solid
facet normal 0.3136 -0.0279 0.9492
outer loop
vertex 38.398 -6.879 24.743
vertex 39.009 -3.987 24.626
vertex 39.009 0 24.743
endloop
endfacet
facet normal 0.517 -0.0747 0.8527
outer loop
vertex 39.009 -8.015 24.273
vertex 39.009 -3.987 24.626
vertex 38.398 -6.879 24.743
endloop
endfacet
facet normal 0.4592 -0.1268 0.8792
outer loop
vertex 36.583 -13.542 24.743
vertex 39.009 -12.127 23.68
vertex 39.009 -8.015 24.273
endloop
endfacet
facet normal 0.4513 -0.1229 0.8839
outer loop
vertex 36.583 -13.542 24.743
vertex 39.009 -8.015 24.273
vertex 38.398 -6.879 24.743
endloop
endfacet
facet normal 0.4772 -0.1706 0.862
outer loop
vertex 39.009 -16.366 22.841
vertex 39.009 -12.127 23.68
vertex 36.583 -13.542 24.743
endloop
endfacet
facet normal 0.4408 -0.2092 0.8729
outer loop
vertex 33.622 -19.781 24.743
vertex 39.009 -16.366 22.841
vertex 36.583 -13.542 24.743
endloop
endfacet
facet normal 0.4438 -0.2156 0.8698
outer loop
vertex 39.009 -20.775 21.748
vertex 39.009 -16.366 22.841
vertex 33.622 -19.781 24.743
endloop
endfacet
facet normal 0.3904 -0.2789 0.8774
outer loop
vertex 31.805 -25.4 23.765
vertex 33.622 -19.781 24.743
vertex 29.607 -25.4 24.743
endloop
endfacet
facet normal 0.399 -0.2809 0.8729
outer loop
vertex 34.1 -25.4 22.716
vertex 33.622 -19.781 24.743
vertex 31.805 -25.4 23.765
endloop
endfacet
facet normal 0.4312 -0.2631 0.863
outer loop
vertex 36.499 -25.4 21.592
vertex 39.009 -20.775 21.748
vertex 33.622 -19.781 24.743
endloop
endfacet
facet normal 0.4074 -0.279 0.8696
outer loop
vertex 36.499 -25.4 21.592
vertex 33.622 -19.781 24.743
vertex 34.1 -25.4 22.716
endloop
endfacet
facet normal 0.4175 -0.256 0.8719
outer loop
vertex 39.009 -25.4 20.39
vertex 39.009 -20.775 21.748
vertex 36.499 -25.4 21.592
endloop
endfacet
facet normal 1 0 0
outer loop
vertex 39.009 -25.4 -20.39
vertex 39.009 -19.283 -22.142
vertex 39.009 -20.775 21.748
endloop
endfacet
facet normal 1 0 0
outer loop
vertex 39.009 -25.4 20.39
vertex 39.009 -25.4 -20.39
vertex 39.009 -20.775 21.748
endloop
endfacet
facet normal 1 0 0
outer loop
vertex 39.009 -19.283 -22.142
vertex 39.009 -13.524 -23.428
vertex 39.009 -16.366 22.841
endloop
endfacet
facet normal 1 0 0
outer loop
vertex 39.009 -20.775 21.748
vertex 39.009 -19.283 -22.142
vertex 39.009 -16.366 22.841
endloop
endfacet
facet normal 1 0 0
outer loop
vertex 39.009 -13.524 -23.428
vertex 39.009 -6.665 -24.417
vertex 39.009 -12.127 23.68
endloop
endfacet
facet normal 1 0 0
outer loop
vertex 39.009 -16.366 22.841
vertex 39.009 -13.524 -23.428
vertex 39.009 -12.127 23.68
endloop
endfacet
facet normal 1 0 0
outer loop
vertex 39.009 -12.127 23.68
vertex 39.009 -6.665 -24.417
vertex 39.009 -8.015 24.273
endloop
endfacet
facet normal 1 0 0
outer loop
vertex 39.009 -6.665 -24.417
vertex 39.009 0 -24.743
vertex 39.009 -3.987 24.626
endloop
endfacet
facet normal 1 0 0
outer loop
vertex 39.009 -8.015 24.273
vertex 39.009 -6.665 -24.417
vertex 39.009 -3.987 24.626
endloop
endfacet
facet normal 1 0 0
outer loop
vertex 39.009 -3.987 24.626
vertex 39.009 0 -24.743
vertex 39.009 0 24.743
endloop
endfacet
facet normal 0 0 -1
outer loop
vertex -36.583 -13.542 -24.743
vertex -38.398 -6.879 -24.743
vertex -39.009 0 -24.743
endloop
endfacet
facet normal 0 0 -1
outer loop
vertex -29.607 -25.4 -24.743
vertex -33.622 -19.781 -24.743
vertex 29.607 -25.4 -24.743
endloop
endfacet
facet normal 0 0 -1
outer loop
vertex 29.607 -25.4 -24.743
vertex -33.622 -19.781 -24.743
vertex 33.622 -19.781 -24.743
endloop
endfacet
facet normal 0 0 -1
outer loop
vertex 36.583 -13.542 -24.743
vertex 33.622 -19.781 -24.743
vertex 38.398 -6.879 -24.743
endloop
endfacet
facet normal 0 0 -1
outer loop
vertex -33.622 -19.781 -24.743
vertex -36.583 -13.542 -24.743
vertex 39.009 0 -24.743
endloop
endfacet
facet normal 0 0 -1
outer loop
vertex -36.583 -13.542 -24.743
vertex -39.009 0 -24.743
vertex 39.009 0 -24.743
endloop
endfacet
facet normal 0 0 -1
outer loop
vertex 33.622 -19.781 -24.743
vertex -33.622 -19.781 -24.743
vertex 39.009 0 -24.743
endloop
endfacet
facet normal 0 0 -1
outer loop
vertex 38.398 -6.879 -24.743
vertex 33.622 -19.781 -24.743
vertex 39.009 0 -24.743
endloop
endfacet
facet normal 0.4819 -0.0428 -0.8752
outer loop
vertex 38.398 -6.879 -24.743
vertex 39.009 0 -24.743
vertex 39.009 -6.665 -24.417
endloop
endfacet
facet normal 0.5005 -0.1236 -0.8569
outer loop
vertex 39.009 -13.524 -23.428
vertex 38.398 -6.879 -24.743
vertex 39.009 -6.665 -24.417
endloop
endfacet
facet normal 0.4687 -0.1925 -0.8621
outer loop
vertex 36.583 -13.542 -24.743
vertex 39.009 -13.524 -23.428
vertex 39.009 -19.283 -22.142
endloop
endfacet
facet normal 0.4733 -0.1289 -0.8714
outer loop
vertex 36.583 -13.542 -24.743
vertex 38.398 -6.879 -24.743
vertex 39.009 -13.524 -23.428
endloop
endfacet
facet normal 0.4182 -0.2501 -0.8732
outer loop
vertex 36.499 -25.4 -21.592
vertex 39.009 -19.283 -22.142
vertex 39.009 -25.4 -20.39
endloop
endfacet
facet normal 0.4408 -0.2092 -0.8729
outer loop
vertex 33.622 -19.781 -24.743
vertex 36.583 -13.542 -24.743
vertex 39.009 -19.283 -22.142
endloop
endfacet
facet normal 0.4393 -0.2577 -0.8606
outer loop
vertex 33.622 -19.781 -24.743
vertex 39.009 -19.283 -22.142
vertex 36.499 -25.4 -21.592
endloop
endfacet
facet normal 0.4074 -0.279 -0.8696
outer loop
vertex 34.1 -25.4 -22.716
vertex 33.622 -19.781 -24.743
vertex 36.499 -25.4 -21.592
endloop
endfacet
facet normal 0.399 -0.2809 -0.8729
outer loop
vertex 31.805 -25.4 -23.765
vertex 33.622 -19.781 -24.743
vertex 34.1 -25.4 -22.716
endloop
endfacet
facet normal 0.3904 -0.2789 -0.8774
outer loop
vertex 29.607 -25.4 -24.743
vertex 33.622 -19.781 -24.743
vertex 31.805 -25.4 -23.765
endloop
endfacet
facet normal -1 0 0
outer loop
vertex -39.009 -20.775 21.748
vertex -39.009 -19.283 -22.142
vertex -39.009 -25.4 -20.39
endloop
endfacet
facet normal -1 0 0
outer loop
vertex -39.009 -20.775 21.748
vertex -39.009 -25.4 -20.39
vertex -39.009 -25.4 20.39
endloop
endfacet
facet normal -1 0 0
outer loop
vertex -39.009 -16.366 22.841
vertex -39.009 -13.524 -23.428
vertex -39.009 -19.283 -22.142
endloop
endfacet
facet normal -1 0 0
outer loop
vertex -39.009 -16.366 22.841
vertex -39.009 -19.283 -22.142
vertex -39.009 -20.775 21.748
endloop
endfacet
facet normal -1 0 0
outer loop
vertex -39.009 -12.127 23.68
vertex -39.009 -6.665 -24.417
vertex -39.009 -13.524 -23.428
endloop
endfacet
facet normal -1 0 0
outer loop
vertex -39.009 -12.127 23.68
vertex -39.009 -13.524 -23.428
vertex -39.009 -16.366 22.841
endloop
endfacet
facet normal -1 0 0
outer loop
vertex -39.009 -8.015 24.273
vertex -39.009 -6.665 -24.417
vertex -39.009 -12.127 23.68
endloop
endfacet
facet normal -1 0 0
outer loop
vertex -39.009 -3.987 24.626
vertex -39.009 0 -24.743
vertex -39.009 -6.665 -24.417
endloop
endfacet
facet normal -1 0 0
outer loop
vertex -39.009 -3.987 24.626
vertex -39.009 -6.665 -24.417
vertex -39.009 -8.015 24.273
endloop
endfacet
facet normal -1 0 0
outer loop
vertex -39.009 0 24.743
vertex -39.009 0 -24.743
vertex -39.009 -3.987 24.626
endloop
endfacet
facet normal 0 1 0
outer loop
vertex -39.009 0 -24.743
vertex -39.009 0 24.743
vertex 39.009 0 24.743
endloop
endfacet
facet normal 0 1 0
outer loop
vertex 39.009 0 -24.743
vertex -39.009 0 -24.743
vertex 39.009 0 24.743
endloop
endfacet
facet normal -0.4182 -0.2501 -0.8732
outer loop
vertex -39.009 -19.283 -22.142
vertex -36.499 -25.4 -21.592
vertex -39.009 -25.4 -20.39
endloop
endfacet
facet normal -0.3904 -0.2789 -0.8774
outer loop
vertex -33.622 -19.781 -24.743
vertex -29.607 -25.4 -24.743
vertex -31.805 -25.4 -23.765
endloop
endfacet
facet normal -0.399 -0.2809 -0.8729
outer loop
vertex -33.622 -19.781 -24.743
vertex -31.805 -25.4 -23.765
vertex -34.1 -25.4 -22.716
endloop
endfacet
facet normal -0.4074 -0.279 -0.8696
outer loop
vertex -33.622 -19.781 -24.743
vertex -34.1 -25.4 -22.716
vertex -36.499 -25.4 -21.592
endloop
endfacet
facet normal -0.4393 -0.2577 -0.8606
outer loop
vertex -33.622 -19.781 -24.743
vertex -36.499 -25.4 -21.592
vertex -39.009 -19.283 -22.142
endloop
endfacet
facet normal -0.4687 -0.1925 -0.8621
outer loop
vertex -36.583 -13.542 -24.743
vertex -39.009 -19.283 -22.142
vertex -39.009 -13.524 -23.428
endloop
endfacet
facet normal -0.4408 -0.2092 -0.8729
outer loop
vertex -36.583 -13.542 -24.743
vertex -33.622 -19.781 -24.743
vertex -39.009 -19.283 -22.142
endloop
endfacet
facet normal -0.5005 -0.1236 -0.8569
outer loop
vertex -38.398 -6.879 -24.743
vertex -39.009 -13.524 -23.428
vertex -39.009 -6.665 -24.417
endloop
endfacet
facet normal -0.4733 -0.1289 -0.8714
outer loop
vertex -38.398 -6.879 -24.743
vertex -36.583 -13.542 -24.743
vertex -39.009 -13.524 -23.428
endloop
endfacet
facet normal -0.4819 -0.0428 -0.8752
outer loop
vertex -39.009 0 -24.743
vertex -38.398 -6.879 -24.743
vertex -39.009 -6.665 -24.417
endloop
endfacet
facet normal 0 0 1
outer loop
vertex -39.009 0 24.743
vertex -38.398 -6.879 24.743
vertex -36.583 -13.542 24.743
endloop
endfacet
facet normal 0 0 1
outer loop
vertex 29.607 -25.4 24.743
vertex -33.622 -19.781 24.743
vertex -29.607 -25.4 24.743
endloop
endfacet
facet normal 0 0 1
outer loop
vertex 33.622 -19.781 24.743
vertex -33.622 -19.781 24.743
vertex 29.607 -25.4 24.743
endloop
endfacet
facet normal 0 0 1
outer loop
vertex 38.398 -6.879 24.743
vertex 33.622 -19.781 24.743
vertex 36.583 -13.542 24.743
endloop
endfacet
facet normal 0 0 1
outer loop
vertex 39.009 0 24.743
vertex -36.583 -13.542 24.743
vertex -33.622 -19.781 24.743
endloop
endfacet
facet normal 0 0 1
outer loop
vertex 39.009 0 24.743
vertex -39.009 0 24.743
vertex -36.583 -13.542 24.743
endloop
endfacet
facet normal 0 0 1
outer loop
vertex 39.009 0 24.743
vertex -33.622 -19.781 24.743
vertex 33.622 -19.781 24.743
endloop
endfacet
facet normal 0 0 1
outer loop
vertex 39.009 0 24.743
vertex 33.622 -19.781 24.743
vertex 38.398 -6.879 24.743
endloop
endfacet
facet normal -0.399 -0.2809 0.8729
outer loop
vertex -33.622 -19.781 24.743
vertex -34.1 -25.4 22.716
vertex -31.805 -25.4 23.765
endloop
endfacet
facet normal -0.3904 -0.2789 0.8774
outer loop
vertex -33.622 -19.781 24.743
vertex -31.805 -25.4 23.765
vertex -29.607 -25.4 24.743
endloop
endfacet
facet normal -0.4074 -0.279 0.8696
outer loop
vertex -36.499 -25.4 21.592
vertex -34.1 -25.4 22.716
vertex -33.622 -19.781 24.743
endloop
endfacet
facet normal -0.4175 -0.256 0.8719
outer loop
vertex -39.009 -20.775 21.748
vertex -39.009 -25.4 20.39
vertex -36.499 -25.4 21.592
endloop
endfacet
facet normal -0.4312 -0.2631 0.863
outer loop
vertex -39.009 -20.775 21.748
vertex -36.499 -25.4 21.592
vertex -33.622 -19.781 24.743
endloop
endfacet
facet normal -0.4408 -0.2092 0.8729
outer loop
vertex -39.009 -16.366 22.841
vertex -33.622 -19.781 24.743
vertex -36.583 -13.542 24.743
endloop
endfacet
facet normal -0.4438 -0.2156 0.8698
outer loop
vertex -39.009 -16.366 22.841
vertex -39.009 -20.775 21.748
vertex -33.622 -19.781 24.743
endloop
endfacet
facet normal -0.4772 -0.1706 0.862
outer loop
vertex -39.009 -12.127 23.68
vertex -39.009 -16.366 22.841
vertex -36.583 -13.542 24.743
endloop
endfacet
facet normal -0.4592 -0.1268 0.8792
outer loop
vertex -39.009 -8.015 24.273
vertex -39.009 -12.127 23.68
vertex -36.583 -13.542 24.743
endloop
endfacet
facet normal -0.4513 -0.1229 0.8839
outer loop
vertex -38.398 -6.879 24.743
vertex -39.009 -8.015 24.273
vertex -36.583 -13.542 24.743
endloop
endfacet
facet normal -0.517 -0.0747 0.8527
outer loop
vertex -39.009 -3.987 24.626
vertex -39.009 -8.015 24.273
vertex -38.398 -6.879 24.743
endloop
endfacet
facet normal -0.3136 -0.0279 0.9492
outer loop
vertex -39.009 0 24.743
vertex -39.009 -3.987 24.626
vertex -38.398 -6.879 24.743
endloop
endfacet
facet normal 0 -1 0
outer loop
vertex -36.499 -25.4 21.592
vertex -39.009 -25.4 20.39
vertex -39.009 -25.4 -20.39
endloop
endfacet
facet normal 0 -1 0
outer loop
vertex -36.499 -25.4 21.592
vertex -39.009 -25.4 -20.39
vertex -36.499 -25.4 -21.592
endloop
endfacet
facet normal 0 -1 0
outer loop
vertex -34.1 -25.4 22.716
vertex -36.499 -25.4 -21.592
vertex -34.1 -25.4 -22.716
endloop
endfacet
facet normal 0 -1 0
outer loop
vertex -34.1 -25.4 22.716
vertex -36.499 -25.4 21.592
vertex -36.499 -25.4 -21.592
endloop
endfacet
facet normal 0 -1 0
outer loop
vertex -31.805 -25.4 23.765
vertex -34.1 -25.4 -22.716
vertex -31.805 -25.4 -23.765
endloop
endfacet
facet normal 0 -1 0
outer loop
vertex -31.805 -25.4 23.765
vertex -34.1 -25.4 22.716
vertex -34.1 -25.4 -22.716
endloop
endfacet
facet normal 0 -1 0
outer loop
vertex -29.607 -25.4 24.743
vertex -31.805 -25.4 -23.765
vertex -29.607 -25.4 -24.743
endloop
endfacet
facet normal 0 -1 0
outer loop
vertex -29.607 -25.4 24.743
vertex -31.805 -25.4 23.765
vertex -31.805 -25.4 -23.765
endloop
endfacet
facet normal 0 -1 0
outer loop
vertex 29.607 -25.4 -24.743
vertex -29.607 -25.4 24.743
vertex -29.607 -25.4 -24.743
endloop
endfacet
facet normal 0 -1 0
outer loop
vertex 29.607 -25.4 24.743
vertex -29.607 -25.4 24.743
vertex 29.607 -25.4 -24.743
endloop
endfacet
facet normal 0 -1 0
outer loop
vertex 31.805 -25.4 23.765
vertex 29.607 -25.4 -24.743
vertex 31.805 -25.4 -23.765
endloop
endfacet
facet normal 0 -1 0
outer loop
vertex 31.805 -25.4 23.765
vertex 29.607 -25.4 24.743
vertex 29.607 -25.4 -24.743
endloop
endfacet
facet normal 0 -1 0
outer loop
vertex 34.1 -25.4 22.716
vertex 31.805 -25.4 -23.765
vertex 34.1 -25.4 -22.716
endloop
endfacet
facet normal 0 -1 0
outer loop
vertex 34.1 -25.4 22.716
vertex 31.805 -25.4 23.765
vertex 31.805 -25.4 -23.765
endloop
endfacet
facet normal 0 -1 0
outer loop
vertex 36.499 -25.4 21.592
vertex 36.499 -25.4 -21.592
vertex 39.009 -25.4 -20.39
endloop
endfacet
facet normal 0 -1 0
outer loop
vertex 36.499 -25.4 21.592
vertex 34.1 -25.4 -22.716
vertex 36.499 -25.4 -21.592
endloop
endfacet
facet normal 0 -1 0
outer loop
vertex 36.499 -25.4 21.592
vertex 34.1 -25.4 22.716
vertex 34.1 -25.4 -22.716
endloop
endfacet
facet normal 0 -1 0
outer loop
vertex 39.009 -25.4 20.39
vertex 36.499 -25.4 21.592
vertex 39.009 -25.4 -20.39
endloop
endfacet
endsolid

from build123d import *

# Parameters (mm, degrees)
F0_W     = 78.01886
F0_H     = 49.48626
F1_DEPTH = 25.4


with BuildPart() as f1:
    # F0 (on Front) → F1 (new body)
    with BuildSketch(Plane.XZ):
        Rectangle(F0_W, F0_H)
    extrude(amount=F1_DEPTH)

    # F2 (on Front) → F3 (revolve, cut)
    with BuildSketch(Plane.XZ):
        Polygon((57.689671, 24.74313), (39.00943, 24.74313), (57.689671, 13.958088), align=None)
        Polygon((57.689671, -13.958088), (39.00943, -24.74313), (57.689671, -24.74313), align=None)
    revolve(axis=Axis((0, 0, 0), (0, 0, -1)), mode=Mode.SUBTRACT)


solid = f1.part
